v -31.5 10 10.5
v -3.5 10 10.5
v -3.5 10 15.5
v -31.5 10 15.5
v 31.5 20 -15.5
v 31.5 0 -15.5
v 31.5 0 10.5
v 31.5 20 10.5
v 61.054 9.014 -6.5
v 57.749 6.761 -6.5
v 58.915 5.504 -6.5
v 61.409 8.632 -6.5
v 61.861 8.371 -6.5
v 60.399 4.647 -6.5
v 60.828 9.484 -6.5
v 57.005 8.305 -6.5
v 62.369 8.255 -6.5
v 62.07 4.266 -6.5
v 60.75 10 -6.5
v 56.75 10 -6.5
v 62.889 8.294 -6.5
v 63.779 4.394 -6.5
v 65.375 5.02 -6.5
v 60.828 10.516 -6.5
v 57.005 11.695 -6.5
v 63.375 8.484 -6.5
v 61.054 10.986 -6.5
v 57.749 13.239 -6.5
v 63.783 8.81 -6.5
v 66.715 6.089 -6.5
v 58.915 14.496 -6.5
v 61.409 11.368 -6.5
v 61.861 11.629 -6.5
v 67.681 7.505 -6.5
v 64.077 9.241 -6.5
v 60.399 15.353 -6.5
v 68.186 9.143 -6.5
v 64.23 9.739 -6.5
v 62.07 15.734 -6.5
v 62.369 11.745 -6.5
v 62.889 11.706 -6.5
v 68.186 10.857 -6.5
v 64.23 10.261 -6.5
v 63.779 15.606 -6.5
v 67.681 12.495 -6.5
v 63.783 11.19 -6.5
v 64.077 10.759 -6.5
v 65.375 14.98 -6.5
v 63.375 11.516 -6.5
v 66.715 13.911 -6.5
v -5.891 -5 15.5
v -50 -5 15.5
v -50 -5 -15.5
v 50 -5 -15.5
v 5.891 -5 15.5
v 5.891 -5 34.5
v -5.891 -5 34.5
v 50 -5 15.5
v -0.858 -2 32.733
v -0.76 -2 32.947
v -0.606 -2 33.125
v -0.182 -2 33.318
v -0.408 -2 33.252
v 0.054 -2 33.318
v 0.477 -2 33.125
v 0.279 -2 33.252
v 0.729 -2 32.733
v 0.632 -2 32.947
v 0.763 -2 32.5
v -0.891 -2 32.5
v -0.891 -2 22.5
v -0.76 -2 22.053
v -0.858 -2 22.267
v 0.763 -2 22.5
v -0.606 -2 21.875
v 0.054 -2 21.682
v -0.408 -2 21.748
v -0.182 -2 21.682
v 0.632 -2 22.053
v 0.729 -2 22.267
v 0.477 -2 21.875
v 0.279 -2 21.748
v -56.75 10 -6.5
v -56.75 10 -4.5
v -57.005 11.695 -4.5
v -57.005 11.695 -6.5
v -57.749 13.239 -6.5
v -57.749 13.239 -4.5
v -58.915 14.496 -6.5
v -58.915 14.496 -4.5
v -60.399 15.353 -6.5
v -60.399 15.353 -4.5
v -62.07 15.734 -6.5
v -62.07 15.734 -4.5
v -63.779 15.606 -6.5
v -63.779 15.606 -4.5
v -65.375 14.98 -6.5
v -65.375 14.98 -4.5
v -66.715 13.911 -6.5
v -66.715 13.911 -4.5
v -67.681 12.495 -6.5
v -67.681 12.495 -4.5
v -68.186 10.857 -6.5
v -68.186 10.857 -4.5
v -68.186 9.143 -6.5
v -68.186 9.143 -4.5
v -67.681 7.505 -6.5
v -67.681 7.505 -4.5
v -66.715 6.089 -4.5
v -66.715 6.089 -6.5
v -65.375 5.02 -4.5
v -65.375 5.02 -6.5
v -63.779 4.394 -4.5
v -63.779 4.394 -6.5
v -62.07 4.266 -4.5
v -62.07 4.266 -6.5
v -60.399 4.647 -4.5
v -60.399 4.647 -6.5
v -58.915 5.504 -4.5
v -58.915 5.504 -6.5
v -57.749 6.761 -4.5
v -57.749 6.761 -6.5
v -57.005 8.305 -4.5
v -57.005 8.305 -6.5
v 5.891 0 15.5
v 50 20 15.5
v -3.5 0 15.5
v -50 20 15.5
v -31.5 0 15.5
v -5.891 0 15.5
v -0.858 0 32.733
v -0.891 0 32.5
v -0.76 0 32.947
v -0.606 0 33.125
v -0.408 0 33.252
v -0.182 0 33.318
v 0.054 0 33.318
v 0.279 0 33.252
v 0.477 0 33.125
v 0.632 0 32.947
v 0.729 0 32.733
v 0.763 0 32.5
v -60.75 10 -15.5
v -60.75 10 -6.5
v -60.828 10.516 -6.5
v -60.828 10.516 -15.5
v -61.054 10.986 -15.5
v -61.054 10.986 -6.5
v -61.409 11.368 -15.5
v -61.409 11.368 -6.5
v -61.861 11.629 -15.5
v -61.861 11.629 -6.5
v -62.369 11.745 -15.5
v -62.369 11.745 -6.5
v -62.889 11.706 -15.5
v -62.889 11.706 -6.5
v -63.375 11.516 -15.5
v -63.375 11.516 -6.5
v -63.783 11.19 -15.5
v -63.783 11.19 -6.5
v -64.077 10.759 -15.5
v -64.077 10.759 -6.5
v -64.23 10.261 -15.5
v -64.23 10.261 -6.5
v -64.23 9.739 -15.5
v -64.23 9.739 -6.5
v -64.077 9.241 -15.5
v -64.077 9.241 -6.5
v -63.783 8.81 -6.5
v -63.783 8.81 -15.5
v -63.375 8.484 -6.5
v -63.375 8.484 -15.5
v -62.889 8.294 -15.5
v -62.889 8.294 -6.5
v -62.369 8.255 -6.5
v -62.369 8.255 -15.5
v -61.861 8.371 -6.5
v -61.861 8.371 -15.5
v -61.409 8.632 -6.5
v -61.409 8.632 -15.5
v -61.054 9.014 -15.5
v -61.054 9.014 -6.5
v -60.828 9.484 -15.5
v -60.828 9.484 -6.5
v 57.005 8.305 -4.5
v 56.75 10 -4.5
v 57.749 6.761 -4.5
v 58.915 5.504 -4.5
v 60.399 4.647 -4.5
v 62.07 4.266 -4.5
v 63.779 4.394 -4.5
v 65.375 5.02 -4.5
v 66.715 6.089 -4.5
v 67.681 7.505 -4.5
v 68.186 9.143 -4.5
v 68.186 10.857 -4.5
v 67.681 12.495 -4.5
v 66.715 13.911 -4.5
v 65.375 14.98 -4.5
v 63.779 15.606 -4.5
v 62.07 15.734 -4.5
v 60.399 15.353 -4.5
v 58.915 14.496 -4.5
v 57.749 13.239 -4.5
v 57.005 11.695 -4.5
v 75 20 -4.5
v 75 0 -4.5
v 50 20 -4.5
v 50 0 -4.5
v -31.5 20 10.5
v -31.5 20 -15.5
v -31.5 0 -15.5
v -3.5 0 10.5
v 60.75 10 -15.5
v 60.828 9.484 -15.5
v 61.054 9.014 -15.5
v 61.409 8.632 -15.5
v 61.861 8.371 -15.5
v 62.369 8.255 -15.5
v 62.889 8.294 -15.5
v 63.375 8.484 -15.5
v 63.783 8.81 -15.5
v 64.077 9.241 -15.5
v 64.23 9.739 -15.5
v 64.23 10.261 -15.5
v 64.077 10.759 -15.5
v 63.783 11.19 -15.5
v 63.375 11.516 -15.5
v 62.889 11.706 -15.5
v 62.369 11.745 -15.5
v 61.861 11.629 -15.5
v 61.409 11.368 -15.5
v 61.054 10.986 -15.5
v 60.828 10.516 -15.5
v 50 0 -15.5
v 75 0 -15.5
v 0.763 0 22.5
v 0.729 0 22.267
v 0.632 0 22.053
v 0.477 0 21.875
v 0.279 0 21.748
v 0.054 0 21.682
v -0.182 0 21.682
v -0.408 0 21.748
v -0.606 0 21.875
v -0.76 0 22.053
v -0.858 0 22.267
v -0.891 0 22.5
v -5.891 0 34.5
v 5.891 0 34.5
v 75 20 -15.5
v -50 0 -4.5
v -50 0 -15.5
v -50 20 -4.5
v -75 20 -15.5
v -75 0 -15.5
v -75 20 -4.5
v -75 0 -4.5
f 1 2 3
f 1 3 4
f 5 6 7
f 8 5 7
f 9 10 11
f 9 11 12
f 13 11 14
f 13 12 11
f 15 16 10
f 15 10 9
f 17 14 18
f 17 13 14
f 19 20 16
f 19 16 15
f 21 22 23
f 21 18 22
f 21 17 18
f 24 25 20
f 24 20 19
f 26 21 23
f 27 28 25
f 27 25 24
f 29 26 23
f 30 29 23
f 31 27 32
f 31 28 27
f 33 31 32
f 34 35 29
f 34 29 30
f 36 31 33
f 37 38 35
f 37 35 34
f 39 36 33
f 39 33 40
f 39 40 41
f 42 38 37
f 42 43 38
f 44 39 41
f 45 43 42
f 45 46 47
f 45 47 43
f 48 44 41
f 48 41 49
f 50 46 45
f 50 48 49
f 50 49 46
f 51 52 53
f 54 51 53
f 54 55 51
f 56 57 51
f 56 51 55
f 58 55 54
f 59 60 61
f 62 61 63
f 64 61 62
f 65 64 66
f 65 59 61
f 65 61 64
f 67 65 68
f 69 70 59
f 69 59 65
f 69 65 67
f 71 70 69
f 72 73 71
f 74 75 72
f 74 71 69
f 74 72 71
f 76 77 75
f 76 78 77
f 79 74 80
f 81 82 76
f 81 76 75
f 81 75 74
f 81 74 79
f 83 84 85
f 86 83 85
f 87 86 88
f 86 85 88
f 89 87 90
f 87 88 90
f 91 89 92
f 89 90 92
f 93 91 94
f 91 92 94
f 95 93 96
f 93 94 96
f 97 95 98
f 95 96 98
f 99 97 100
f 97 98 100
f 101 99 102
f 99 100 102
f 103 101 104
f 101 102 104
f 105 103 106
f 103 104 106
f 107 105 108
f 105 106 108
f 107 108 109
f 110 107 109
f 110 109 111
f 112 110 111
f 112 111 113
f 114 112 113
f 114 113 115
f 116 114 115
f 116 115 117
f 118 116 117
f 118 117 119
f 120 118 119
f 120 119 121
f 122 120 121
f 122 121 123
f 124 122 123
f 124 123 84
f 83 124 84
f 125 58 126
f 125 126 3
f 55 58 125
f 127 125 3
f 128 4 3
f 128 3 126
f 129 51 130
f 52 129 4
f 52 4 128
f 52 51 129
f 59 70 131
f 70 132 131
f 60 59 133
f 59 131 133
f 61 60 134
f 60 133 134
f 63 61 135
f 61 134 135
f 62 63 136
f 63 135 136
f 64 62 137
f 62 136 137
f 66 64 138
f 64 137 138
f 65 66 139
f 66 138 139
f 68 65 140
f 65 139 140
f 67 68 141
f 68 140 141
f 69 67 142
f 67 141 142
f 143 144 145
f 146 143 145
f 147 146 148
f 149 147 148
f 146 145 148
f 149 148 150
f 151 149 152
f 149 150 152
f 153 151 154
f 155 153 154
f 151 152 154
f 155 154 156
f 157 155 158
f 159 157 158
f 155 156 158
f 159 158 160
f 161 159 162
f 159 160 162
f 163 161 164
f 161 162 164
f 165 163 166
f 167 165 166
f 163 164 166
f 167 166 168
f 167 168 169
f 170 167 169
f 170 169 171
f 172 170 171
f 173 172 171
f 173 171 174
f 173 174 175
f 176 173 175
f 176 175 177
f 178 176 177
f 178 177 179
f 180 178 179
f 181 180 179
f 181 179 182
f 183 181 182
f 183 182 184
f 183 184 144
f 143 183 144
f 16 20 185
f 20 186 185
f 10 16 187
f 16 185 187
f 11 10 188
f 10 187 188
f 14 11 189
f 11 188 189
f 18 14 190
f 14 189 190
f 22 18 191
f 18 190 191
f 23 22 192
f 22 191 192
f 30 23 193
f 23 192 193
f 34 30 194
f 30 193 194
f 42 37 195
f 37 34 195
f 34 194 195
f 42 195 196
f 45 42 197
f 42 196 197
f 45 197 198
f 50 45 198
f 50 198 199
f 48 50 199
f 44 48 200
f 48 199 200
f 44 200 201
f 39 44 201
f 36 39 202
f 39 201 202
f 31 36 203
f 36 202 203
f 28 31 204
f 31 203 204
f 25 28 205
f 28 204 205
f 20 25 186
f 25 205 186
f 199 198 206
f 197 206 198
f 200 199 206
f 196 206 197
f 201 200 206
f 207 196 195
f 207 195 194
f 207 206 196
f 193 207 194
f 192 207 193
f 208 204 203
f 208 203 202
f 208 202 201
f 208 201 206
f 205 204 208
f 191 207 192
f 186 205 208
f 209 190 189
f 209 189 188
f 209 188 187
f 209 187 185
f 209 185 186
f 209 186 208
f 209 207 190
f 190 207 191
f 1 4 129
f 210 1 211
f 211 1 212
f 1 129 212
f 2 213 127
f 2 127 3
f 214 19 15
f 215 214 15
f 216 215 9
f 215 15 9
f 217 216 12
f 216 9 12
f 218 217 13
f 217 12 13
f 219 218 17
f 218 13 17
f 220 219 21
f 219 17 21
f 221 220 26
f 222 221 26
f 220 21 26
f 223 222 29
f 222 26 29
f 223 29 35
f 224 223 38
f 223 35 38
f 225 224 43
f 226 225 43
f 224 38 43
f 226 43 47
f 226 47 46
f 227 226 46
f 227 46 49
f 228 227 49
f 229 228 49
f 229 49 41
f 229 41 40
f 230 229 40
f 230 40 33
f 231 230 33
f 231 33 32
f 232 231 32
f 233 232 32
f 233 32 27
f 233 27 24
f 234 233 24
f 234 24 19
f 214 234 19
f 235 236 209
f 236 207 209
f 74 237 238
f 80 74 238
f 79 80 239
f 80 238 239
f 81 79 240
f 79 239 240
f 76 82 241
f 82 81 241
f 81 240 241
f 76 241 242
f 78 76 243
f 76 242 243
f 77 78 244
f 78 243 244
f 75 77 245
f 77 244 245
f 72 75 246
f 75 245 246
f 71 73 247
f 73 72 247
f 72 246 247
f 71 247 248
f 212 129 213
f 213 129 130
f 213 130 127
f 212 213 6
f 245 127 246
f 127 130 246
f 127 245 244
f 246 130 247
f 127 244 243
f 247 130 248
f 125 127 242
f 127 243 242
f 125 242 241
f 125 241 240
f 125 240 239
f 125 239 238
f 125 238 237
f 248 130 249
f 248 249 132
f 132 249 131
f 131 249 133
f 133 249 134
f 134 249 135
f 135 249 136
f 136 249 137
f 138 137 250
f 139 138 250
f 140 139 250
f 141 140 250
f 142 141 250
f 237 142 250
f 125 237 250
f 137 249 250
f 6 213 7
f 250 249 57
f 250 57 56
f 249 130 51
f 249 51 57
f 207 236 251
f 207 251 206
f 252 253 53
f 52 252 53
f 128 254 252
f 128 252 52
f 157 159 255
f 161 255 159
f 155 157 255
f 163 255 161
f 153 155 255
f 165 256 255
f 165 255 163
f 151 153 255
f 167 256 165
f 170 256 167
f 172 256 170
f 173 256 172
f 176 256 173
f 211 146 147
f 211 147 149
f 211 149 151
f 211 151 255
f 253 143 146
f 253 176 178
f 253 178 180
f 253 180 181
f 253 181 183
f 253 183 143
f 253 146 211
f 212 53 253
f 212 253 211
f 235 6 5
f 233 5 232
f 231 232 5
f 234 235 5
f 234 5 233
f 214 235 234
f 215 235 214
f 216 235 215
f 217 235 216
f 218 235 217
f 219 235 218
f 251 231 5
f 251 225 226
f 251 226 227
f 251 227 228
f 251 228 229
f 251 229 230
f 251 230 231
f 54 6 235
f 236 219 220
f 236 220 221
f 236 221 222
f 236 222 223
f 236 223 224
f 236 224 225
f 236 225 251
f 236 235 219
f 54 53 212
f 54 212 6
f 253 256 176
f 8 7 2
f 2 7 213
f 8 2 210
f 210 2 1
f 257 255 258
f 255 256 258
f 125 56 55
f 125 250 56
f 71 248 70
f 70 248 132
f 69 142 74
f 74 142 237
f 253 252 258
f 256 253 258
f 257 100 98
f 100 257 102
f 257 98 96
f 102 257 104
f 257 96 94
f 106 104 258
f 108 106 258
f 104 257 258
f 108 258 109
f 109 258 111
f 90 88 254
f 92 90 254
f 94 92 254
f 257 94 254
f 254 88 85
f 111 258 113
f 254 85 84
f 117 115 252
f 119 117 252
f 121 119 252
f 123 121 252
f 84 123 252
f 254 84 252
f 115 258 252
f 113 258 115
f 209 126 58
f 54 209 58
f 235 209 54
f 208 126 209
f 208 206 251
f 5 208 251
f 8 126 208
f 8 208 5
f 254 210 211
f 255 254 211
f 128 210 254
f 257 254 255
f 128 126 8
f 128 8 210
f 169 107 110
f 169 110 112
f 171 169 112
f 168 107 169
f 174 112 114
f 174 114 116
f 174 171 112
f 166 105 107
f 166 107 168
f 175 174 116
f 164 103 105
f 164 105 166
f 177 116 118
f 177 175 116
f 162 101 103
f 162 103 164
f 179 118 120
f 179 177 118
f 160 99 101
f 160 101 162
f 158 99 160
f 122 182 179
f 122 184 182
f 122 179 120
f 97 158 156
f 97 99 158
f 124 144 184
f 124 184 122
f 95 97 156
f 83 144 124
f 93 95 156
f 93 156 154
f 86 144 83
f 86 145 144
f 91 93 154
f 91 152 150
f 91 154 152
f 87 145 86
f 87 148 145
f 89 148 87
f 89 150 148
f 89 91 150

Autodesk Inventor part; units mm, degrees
ref_plane "YZ Plane" through (0, 0, 0) normal (1, 0, 0) x (0, 1, 0)
ref_plane "XZ Plane" through (0, 0, 0) normal (0, 1, 0) x (-1, 0, 0)
ref_plane "XY Plane" through (0, 0, 0) normal (0, 0, 1) x (1, 0, 0)
sketch "Sketch1" plane through (0, 0, 0) normal (0, 1, 0) x (-1, 0, 0)
  line L0 (50, -15.5) -> (-50, -15.5)
  line L1 (-50, -15.5) -> (-50, 15.5)
  line L2 (-50, 15.5) -> (50, 15.5)
  line L3 (50, 15.5) -> (50, -15.5)
  line L4 (31.5, -15.5) -> (-31.5, -15.5)
  line L5 (-31.5, -15.5) -> (-31.5, 10.5)
  line L6 (-31.5, 10.5) -> (31.5, 10.5)
  line L7 (31.5, 10.5) -> (31.5, -15.5)
  line L8 (50, -15.5) -> (75, -15.5)
  line L9 (75, -15.5) -> (75, -4.5)
  line L10 (75, -4.5) -> (50, -4.5)
  line L11 (50, -4.5) -> (50, -15.5)
  line L12 (0, 0) -> (0, -15.5)
  line L13 (-50, -15.5) -> (-75, -15.5)
  line L14 (-75, -15.5) -> (-75, -4.5)
  line L15 (-75, -4.5) -> (-50, -4.5)
  point P0 (-50, -4.5)
  point P1 (-31.5, -15.5)
  dimension "d0" = 100
  dimension "d1" = 50
  dimension "d2" = 31
  dimension "d3" = 15.5
  dimension "d4" = 26
  dimension "d5" = 63
  dimension "d6" = 31.5
  dimension "d7" = 11
  dimension "d8" = 25
extrude "Extrusion1" add sketch "Sketch1" along normal blind 20 contours L0 L7 L6 L5 L1 L2 L3 | L3 L10 L9 L8 | L13 L14 L15 L1
sketch "Sketch2" plane through (-75, 0, -4.5) normal (0, 0, 1) x (1, 0, 0)
  line L0 (0, 0) -> (25, 0) projected
  line L1 (25, 0) -> (25, 20) projected
  line L2 (0, 20) -> (25, 20) projected
  line L3 (0, 0) -> (0, 20) projected
  circle A0 centre (12.5, 10) radius 1.75
  circle A1 centre (12.5, 10) radius 5.75
  point P0 (75, 0)
  dimension "d11" = 3.5
  dimension "d12" = 11.5
extrude "Extrusion2" cut sketch "Sketch2" against normal through all contours A0
extrude "Extrusion3" cut sketch "Sketch2" against normal blind 2 contours A1
mirror "Mirror1" about plane through (0, 0, 0) normal (1, 0, 0) of "Extrusion3", "Extrusion2"
sketch "Sketch4" plane through (0, 0, 0) normal (0, -1, 0) x (1, 0, 0)
  line L0 (-31.5, -15.5) -> (-75, -15.5) projected
  line L1 (-31.5, 10.5) -> (-31.5, -15.5) projected
  line L2 (31.5, 10.5) -> (-31.5, 10.5) projected
  line L3 (31.5, -15.5) -> (31.5, 10.5) projected
  line L4 (75, -15.5) -> (31.5, -15.5) projected
  line L5 (75, -4.5) -> (75, -15.5) projected
  line L6 (50, -4.5) -> (75, -4.5) projected
  line L7 (50, 15.5) -> (50, -4.5) projected
  line L8 (-50, 15.5) -> (50, 15.5) projected
  line L9 (-50, -4.5) -> (-50, 15.5) projected
  line L10 (-75, -4.5) -> (-50, -4.5) projected
  line L11 (-75, -15.5) -> (-75, -4.5) projected
  line L12 (75, -15.5) -> (31.5, -15.5) projected
  line L13 (50, -15.5) -> (-50, -15.5)
  line L14 (-50, -15.5) -> (-50, 34.5)
  line L15 (-50, 34.5) -> (50, 34.5)
  line L16 (50, 34.5) -> (50, -15.5)
  point P0 (0, 0)
  dimension "d22" = 100
  dimension "d23" = 50
extrude "Extrusion5" add sketch "Sketch4" along normal blind 5 contours L0 L14 L9 L8 L7 L16 L4 L3 L2 L1 | L1 L2 L3 L13 | L14 L15 L16 L8
sketch "Sketch5" plane through (31.5, 20, 10.5) normal (0, 0, -1) x (-1, 0, 0)
  line L0 (63, -20) -> (0, -20) projected
  line L1 (63, -20) -> (35, -20)
  line L2 (35, -20) -> (35, -10)
  line L3 (35, -10) -> (63, -10)
  line L4 (63, -10) -> (63, -20)
  point P0 (31.5, -20)
  dimension "d26" = 28
  dimension "d27" = 10
extrude "Extrusion6" cut sketch "Sketch5" against normal blind 57
sketch "Sketch6" plane through (0, 0, 0) normal (0, 1, 0) x (1, 0, 0)
  line L0 (-50, -15.5) -> (-31.5, -15.5) projected
  line L1 (-50, -34.5) -> (-50, -15.5) projected
  line L2 (50, -34.5) -> (-50, -34.5) projected
  line L3 (50, -15.5) -> (50, -34.5) projected
  line L4 (-3.5, -15.5) -> (50, -15.5) projected
  line L5 (-3.5, -10.5) -> (-3.5, -15.5) projected
  line L6 (31.5, -10.5) -> (-3.5, -10.5) projected
  line L7 (31.5, 15.5) -> (31.5, -10.5) projected
  line L8 (-31.5, 15.5) -> (31.5, 15.5) projected
  line L9 (-31.5, 15.5) -> (-31.5, -15.5) projected
  line L10 (-0.0641, -15.5) -> (-0.0641, -32.5)
  line L11 (-0.0641, -32.5) -> (-0.0641, -22.5) construction
  line L12 (0.7628, -32.5) -> (0.7628, -22.5)
  line L13 (-0.891, -22.5) -> (-0.891, -32.5)
  arc A0 (-0.891, -32.5) -> (0.7628, -32.5) centre (-0.0641, -32.5) ccw
  arc A1 (0.7628, -22.5) -> (-0.891, -22.5) centre (-0.0641, -22.5) ccw
  point P0 (0, 0)
  point P1 (-0.0641, -27.5)
  dimension "d36" = 10
  dimension "d37" = 2
extrude "Extrusion7" cut sketch "Sketch6" against normal blind 2 contours A1 L12 A0 L13
sketch "Sketch7" plane through (0, 0, 0) normal (0, 1, 0) x (1, 0, 0)
  line L0 (-3.5, -10.5) -> (-3.5, -15.5) projected
  arc A0 (-0.891, -32.5) -> (0.7628, -32.5) centre (-0.0641, -32.5) ccw projected
  line L1 (-0.891, -32.5) -> (-0.891, -22.5) projected
  arc A1 (0.7628, -22.5) -> (-0.891, -22.5) centre (-0.0641, -22.5) ccw projected
  line L2 (0.7628, -22.5) -> (0.7628, -32.5) projected
  line L3 (-50, -15.5) -> (-31.5, -15.5) projected
  line L4 (-50, -34.5) -> (-50, -15.5) projected
  line L5 (50, -34.5) -> (-50, -34.5) projected
  line L6 (50, -15.5) -> (50, -34.5) projected
  line L7 (-3.5, -15.5) -> (50, -15.5) projected
  line L8 (-3.5, -10.5) -> (-3.5, -15.5) projected
  line L9 (31.5, -10.5) -> (-3.5, -10.5) projected
  line L10 (31.5, 15.5) -> (31.5, -10.5) projected
  line L11 (-31.5, 15.5) -> (31.5, 15.5) projected
  line L12 (-31.5, 15.5) -> (-31.5, -15.5) projected
  line L13 (-3.5, -15.5) -> (50, -15.5) projected
  line L14 (50, -34.5) -> (-50, -34.5) projected
  line L15 (-3.5, -15.5) -> (-50, -15.5)
  line L16 (-50, -15.5) -> (-50, -34.5)
  line L17 (-50, -34.5) -> (-3.5, -34.5)
  line L18 (-3.5, -34.5) -> (-3.5, -15.5)
  line L19 (-50, -15.5) -> (50, -15.5) projected
  line L20 (-5.891, -34.5) -> (-50, -34.5)
  line L21 (-50, -34.5) -> (-50, -15.5)
  line L22 (-50, -15.5) -> (-5.891, -15.5)
  line L23 (-5.891, -15.5) -> (-5.891, -34.5)
  point P0 (0, 0)
  point P1 (-5.891, -34.5)
  point P2 (-5.891, -15.5)
  dimension "d32" = 5
extrude "Extrusion8" cut sketch "Sketch7" against normal blind 24.25 contours L23 L5 L4 L3 L15
mirror "Mirror2" about plane through (0, 0, 0) normal (1, 0, 0) of "Extrusion8"
sketch "Sketch10" plane through (0, 0, 0) normal (0, 1, 0) x (1, 0, 0)
  line L0 (-3.5, -10.5) -> (-3.5, -15.5) projected
  arc A0 (0.7628, -22.5) -> (-0.891, -22.5) centre (-0.0641, -22.5) ccw projected
  line L1 (0.7628, -22.5) -> (0.7628, -32.5) projected
  arc A1 (-0.891, -32.5) -> (0.7628, -32.5) centre (-0.0641, -32.5) ccw projected
  line L2 (-0.891, -32.5) -> (-0.891, -22.5) projected
  line L3 (5.891, -34.5) -> (5.891, -15.5) projected
  line L4 (-3.5, -15.5) -> (5.891, -15.5) projected
  line L5 (-3.5, -10.5) -> (-3.5, -15.5) projected
  line L6 (31.5, -10.5) -> (-3.5, -10.5) projected
  line L7 (31.5, 15.5) -> (31.5, -10.5) projected
  line L8 (-31.5, 15.5) -> (31.5, 15.5) projected
  line L9 (-31.5, 15.5) -> (-31.5, -15.5) projected
  line L10 (-31.5, -15.5) -> (-5.891, -15.5) projected
  line L11 (-5.891, -15.5) -> (-5.891, -34.5) projected
  line L12 (5.891, -34.5) -> (-5.891, -34.5) projected
  line L13 (-3.5, -15.5) -> (3.4148, -15.5)
  line L14 (3.4148, -15.5) -> (3.4148, -19.7081)
  line L15 (3.4148, -19.7081) -> (-3.5, -19.7081)
  line L16 (-3.5, -19.7081) -> (-3.5, -15.5)
  point P0 (0, 0)
equation "\"d1\" = 0.5 * d0"
equation "\"d3\" = 0.5 * d2"
equation "\"d6\" = 0.5 * d5"
properties part number "blah"
